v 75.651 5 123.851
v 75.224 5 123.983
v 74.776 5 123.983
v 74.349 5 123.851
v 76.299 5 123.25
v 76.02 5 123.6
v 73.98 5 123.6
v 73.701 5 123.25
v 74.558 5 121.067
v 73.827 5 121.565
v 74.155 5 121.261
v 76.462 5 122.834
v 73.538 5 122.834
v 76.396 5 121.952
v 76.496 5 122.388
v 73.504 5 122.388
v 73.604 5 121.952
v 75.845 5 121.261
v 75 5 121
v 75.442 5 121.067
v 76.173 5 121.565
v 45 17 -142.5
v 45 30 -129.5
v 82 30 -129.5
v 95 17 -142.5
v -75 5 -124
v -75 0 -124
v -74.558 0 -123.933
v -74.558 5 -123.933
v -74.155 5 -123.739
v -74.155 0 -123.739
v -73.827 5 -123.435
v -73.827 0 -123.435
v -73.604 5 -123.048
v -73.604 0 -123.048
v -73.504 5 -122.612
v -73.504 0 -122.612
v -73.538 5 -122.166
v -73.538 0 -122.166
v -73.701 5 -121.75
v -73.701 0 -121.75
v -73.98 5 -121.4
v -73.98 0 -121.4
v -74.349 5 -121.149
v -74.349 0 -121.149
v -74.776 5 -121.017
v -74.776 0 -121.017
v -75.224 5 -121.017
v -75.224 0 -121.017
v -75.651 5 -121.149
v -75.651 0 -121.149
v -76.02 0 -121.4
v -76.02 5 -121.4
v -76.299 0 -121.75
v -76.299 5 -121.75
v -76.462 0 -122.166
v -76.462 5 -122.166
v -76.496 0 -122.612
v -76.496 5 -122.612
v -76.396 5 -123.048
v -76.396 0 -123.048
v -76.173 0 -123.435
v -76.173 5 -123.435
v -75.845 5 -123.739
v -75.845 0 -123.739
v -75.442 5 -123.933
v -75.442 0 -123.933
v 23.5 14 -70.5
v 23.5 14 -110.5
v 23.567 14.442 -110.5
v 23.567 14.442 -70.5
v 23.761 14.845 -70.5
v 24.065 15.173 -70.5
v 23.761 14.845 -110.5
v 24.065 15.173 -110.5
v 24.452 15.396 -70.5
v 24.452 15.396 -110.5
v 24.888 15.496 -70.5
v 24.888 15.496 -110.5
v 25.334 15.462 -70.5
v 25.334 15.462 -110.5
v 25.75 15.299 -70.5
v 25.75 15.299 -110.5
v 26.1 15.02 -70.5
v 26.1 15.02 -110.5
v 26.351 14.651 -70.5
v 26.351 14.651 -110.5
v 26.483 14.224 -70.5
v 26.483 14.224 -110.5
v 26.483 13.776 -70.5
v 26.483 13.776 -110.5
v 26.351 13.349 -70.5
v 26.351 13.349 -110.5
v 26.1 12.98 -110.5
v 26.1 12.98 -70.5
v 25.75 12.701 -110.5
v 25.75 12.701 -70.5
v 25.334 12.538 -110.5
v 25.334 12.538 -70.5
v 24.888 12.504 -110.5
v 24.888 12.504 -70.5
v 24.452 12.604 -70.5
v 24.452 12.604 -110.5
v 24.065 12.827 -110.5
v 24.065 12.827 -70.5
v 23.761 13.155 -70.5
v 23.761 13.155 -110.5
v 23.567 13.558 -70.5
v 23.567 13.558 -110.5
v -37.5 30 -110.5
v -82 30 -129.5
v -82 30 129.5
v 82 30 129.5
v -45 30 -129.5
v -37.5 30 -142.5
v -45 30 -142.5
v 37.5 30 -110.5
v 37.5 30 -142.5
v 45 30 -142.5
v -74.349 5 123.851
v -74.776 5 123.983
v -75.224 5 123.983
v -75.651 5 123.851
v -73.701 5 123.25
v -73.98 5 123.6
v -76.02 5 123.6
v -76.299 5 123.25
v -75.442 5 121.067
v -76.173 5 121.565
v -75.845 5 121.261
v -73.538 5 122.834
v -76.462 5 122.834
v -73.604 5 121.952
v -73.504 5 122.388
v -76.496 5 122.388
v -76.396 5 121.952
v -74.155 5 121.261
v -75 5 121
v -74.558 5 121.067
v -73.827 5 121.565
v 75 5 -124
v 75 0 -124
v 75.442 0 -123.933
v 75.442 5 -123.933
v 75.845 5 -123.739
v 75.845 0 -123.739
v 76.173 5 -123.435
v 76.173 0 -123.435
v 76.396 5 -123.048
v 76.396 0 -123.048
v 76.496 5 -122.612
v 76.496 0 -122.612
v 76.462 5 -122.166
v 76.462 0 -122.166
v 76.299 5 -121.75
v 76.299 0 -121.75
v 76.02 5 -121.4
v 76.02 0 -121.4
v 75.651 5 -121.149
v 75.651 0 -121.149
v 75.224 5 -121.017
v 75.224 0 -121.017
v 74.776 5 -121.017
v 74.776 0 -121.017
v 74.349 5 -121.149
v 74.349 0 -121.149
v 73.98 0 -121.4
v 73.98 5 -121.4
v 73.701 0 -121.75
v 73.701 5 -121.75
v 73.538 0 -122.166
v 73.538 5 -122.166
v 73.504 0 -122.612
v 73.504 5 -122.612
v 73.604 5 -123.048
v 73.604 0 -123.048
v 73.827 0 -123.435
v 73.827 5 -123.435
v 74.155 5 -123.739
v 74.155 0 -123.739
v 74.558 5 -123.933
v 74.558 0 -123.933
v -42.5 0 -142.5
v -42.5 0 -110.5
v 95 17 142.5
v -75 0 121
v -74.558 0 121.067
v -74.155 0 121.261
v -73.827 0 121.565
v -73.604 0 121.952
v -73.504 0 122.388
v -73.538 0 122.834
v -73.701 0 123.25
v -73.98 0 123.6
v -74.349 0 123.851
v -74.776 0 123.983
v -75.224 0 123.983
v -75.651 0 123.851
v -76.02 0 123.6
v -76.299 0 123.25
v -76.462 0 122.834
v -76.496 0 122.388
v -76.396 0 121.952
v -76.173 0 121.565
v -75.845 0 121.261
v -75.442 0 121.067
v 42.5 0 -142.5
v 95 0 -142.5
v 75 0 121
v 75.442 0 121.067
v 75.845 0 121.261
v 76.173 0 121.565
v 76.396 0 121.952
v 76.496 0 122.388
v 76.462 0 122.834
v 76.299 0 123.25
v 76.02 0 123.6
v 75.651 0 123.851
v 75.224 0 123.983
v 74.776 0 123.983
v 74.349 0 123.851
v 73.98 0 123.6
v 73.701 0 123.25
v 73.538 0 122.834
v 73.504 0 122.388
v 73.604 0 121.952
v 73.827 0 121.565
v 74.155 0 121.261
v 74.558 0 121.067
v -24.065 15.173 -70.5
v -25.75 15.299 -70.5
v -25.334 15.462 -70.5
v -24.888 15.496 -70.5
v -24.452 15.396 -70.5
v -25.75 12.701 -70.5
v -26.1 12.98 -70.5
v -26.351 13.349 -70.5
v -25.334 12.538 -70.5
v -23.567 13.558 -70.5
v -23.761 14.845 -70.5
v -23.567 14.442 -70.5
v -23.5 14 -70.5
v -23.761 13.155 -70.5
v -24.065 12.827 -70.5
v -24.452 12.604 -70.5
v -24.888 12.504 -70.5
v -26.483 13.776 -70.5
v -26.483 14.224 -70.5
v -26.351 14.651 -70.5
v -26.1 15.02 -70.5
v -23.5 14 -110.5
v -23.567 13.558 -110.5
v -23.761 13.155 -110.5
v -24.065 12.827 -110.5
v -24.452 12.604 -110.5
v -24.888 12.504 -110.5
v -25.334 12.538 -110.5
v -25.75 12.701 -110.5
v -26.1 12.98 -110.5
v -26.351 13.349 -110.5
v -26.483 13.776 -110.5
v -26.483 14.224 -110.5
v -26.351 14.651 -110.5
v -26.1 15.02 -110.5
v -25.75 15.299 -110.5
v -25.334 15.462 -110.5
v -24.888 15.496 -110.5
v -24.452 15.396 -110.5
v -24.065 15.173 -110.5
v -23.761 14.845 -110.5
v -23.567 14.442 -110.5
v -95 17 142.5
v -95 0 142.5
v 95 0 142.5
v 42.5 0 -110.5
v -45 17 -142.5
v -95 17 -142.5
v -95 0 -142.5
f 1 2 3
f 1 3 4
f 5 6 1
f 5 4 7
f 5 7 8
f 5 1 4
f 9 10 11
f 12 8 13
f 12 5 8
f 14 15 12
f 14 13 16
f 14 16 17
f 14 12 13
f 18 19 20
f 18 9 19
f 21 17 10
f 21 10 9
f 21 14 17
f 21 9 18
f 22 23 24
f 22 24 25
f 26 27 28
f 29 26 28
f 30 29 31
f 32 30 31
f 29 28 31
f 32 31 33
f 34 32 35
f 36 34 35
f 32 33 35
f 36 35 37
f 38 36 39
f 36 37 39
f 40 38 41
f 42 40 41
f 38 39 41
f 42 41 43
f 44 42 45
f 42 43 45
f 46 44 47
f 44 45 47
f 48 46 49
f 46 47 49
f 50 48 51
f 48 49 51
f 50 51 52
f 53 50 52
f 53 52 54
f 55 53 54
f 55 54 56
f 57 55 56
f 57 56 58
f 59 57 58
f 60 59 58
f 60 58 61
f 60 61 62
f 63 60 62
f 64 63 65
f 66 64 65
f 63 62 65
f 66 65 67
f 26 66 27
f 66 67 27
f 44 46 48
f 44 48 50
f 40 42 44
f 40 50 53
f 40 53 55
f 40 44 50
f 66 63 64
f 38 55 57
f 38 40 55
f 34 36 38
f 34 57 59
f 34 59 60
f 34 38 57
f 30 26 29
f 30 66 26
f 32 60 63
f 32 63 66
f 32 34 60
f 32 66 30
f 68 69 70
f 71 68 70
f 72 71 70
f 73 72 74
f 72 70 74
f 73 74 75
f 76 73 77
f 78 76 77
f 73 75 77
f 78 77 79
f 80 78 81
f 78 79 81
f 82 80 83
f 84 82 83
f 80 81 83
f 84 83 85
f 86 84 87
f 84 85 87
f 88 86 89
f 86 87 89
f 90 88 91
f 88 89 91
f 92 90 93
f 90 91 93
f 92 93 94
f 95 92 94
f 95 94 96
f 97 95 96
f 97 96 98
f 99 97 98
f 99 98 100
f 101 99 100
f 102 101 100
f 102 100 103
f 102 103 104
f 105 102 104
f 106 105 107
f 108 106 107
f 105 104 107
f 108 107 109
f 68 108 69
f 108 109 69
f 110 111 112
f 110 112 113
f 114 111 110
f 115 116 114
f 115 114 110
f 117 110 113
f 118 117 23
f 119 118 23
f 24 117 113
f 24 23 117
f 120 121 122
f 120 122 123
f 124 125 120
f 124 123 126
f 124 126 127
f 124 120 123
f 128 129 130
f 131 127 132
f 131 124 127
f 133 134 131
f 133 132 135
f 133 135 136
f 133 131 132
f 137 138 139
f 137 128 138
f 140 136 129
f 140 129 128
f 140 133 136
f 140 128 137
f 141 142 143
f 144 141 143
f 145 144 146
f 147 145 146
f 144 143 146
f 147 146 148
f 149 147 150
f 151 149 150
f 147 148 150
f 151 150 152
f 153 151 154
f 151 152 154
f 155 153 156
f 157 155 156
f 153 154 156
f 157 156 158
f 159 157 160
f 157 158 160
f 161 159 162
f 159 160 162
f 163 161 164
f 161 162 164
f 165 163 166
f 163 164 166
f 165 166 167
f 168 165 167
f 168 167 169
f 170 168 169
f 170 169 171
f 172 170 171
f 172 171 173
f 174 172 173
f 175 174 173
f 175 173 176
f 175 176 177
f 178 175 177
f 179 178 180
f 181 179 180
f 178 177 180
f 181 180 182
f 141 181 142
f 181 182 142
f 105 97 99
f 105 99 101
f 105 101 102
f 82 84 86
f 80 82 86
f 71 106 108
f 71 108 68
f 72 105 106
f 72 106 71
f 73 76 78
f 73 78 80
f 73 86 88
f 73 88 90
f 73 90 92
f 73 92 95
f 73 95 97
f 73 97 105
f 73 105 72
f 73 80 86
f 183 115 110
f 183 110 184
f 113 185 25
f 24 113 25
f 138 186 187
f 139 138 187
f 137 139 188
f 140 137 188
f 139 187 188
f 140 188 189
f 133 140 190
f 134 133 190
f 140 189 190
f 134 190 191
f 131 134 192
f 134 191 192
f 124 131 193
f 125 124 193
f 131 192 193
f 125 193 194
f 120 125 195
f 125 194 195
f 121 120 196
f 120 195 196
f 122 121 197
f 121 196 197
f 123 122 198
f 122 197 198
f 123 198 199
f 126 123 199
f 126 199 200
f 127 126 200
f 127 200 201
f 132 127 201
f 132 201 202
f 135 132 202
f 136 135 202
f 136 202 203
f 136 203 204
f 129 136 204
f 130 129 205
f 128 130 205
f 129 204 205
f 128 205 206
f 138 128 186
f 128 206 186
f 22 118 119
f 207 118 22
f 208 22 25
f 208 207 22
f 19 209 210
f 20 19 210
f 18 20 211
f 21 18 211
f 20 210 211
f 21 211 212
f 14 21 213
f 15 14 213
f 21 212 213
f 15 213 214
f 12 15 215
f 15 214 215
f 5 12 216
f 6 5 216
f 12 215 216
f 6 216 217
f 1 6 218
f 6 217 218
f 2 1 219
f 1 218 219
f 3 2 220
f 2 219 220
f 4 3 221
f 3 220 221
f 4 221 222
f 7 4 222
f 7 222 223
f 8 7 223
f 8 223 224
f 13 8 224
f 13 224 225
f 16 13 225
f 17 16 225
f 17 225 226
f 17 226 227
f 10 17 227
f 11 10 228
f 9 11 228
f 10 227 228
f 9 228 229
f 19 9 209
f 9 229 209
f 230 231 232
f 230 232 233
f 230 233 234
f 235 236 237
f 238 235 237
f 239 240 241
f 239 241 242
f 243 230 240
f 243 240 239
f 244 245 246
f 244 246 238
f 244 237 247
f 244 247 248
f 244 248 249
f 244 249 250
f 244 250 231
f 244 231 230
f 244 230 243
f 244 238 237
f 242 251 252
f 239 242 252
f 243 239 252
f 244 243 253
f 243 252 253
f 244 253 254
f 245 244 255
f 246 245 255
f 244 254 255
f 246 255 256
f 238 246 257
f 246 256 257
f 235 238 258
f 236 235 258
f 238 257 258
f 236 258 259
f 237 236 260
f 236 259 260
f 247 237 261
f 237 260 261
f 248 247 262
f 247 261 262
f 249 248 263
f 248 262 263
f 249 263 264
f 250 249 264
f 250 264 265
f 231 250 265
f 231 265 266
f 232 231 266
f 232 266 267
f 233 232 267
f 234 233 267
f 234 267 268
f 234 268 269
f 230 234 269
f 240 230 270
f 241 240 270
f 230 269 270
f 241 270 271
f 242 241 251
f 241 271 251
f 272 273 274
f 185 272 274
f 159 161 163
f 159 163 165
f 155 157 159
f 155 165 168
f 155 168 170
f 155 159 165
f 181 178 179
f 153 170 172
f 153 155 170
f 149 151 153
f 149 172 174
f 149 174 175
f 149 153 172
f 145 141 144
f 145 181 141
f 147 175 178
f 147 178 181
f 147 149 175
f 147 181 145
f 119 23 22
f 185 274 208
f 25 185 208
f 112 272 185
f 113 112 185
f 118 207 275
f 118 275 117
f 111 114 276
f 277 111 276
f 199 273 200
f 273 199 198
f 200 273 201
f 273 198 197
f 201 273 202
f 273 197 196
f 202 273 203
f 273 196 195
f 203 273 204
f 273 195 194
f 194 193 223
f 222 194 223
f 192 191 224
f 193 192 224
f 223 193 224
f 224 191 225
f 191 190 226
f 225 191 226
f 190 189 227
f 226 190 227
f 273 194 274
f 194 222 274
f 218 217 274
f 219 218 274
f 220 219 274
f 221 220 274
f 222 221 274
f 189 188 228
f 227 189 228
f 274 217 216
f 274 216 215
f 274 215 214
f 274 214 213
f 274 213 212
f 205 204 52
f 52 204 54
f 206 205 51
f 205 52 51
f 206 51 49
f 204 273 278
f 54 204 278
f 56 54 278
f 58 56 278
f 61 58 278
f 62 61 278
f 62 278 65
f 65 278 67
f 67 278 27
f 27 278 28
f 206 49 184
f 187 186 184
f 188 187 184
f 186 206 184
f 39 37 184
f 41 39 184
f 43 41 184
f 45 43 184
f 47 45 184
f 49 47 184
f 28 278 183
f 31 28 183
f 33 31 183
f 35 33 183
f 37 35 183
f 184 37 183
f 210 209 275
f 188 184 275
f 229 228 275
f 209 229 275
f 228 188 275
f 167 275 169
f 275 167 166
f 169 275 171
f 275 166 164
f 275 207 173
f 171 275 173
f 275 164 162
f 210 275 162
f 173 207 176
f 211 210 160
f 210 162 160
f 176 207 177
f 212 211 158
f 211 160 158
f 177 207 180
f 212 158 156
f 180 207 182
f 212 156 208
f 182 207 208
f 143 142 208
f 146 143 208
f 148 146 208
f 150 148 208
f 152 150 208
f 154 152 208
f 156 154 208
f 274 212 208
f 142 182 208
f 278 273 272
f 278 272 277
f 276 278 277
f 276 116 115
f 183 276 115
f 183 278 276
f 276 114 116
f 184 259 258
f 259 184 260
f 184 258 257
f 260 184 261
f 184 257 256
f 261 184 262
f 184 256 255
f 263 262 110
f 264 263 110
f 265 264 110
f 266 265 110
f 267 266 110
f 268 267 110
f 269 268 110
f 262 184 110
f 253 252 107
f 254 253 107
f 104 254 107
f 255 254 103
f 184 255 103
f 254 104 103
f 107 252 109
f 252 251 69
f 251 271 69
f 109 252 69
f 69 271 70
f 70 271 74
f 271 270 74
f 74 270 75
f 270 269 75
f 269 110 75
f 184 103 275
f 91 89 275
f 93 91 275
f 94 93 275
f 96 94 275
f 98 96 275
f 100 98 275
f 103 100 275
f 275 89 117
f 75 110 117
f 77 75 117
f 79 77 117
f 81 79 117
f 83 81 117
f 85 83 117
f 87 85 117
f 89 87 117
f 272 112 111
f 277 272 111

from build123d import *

# Parameters (mm, degrees)
SKETCH1_W           = 190
SKETCH1_H           = 285
BOSS_EXTRUDE1_DEPTH = 30
CUT_EXTRUDE1_DEPTH  = 32
SKETCH4_R           = 1.5
CUT_EXTRUDE2_DEPTH  = 40
CUT_EXTRUDE3_START  = 45
CUT_EXTRUDE3_DEPTH  = 51
CUT_EXTRUDE4_START  = -45
CUT_EXTRUDE4_DEPTH  = 51
CHAMFER1_SIZE       = 13
SKETCH6_R           = 1.5
CUT_EXTRUDE5_DEPTH  = 5


with BuildPart() as part:
    # Sketch1 → Boss-Extrude1 (new body)
    with BuildSketch(Plane(origin=(0, 0, 0), x_dir=(1, 0, 0), z_dir=(0, 1, 0))):
        Rectangle(SKETCH1_W, SKETCH1_H)
    extrude(amount=BOSS_EXTRUDE1_DEPTH)

    # Sketch3 → Cut-Extrude1 (cut)
    with BuildSketch(Plane(origin=(0, 0, -142.5), x_dir=(-1, 0, 0), z_dir=(0, 0, -1))):
        Polygon((-37.5, 30), (37.5, 30), (42.5, 0), (-42.5, 0), align=None)
    extrude(amount=-CUT_EXTRUDE1_DEPTH, mode=Mode.SUBTRACT)

    # Sketch4 → Cut-Extrude2 (cut)
    with BuildSketch(Plane(origin=(0, 0, -110.5), x_dir=(-1, 0, 0), z_dir=(0, 0, -1))):
        with Locations((-25, 14)):
            Circle(SKETCH4_R)
        with Locations(Location((25, 14, 0), (0, 0, 180))):  # turned: the seam where the file's is
            Circle(SKETCH4_R)
    extrude(amount=-CUT_EXTRUDE2_DEPTH, mode=Mode.SUBTRACT)

    # Sketch5 → Cut-Extrude3 (cut, through all)
    with BuildSketch(Plane(origin=(0, 0, 0), x_dir=(0, 0, -1), z_dir=(1, 0, 0)).offset(CUT_EXTRUDE3_START)):
        Polygon((129.5, 30), (142.5, 17), (142.5, 30), align=None)
    extrude(amount=CUT_EXTRUDE3_DEPTH, mode=Mode.SUBTRACT)

    # Sketch5_2 → Cut-Extrude4 (cut, through all)
    with BuildSketch(Plane(origin=(0, 0, 0), x_dir=(0, 0, -1), z_dir=(1, 0, 0)).offset(CUT_EXTRUDE4_START)):
        Polygon((129.5, 30), (142.5, 17), (142.5, 30), align=None)
    extrude(amount=-CUT_EXTRUDE4_DEPTH, mode=Mode.SUBTRACT)

    # Chamfer1
    chamfer1_edges = [part.edges().sort_by_distance(p)[0] for p in [
        (-95, 30, 6.5),
        (0, 30, 142.5),
        (95, 30, 6.5),
    ]]
    chamfer(chamfer1_edges, length=CHAMFER1_SIZE)

    # Sketch6 → Cut-Extrude5 (cut)
    with BuildSketch(Plane.XZ):
        with Locations(Location((-75, 122.5, 0), (0, 0, 270))):  # turned: the seam where the file's is
            Circle(SKETCH6_R)
        with Locations(Location((75, 122.5, 0), (0, 0, 270))):  # turned: the seam where the file's is
            Circle(SKETCH6_R)
        with Locations(Location((-75, -122.5, 0), (0, 0, 270))):  # turned: the seam where the file's is
            Circle(SKETCH6_R)
        with Locations(Location((75, -122.5, 0), (0, 0, 270))):  # turned: the seam where the file's is
            Circle(SKETCH6_R)
    extrude(amount=-CUT_EXTRUDE5_DEPTH, mode=Mode.SUBTRACT)


solid = part.part
